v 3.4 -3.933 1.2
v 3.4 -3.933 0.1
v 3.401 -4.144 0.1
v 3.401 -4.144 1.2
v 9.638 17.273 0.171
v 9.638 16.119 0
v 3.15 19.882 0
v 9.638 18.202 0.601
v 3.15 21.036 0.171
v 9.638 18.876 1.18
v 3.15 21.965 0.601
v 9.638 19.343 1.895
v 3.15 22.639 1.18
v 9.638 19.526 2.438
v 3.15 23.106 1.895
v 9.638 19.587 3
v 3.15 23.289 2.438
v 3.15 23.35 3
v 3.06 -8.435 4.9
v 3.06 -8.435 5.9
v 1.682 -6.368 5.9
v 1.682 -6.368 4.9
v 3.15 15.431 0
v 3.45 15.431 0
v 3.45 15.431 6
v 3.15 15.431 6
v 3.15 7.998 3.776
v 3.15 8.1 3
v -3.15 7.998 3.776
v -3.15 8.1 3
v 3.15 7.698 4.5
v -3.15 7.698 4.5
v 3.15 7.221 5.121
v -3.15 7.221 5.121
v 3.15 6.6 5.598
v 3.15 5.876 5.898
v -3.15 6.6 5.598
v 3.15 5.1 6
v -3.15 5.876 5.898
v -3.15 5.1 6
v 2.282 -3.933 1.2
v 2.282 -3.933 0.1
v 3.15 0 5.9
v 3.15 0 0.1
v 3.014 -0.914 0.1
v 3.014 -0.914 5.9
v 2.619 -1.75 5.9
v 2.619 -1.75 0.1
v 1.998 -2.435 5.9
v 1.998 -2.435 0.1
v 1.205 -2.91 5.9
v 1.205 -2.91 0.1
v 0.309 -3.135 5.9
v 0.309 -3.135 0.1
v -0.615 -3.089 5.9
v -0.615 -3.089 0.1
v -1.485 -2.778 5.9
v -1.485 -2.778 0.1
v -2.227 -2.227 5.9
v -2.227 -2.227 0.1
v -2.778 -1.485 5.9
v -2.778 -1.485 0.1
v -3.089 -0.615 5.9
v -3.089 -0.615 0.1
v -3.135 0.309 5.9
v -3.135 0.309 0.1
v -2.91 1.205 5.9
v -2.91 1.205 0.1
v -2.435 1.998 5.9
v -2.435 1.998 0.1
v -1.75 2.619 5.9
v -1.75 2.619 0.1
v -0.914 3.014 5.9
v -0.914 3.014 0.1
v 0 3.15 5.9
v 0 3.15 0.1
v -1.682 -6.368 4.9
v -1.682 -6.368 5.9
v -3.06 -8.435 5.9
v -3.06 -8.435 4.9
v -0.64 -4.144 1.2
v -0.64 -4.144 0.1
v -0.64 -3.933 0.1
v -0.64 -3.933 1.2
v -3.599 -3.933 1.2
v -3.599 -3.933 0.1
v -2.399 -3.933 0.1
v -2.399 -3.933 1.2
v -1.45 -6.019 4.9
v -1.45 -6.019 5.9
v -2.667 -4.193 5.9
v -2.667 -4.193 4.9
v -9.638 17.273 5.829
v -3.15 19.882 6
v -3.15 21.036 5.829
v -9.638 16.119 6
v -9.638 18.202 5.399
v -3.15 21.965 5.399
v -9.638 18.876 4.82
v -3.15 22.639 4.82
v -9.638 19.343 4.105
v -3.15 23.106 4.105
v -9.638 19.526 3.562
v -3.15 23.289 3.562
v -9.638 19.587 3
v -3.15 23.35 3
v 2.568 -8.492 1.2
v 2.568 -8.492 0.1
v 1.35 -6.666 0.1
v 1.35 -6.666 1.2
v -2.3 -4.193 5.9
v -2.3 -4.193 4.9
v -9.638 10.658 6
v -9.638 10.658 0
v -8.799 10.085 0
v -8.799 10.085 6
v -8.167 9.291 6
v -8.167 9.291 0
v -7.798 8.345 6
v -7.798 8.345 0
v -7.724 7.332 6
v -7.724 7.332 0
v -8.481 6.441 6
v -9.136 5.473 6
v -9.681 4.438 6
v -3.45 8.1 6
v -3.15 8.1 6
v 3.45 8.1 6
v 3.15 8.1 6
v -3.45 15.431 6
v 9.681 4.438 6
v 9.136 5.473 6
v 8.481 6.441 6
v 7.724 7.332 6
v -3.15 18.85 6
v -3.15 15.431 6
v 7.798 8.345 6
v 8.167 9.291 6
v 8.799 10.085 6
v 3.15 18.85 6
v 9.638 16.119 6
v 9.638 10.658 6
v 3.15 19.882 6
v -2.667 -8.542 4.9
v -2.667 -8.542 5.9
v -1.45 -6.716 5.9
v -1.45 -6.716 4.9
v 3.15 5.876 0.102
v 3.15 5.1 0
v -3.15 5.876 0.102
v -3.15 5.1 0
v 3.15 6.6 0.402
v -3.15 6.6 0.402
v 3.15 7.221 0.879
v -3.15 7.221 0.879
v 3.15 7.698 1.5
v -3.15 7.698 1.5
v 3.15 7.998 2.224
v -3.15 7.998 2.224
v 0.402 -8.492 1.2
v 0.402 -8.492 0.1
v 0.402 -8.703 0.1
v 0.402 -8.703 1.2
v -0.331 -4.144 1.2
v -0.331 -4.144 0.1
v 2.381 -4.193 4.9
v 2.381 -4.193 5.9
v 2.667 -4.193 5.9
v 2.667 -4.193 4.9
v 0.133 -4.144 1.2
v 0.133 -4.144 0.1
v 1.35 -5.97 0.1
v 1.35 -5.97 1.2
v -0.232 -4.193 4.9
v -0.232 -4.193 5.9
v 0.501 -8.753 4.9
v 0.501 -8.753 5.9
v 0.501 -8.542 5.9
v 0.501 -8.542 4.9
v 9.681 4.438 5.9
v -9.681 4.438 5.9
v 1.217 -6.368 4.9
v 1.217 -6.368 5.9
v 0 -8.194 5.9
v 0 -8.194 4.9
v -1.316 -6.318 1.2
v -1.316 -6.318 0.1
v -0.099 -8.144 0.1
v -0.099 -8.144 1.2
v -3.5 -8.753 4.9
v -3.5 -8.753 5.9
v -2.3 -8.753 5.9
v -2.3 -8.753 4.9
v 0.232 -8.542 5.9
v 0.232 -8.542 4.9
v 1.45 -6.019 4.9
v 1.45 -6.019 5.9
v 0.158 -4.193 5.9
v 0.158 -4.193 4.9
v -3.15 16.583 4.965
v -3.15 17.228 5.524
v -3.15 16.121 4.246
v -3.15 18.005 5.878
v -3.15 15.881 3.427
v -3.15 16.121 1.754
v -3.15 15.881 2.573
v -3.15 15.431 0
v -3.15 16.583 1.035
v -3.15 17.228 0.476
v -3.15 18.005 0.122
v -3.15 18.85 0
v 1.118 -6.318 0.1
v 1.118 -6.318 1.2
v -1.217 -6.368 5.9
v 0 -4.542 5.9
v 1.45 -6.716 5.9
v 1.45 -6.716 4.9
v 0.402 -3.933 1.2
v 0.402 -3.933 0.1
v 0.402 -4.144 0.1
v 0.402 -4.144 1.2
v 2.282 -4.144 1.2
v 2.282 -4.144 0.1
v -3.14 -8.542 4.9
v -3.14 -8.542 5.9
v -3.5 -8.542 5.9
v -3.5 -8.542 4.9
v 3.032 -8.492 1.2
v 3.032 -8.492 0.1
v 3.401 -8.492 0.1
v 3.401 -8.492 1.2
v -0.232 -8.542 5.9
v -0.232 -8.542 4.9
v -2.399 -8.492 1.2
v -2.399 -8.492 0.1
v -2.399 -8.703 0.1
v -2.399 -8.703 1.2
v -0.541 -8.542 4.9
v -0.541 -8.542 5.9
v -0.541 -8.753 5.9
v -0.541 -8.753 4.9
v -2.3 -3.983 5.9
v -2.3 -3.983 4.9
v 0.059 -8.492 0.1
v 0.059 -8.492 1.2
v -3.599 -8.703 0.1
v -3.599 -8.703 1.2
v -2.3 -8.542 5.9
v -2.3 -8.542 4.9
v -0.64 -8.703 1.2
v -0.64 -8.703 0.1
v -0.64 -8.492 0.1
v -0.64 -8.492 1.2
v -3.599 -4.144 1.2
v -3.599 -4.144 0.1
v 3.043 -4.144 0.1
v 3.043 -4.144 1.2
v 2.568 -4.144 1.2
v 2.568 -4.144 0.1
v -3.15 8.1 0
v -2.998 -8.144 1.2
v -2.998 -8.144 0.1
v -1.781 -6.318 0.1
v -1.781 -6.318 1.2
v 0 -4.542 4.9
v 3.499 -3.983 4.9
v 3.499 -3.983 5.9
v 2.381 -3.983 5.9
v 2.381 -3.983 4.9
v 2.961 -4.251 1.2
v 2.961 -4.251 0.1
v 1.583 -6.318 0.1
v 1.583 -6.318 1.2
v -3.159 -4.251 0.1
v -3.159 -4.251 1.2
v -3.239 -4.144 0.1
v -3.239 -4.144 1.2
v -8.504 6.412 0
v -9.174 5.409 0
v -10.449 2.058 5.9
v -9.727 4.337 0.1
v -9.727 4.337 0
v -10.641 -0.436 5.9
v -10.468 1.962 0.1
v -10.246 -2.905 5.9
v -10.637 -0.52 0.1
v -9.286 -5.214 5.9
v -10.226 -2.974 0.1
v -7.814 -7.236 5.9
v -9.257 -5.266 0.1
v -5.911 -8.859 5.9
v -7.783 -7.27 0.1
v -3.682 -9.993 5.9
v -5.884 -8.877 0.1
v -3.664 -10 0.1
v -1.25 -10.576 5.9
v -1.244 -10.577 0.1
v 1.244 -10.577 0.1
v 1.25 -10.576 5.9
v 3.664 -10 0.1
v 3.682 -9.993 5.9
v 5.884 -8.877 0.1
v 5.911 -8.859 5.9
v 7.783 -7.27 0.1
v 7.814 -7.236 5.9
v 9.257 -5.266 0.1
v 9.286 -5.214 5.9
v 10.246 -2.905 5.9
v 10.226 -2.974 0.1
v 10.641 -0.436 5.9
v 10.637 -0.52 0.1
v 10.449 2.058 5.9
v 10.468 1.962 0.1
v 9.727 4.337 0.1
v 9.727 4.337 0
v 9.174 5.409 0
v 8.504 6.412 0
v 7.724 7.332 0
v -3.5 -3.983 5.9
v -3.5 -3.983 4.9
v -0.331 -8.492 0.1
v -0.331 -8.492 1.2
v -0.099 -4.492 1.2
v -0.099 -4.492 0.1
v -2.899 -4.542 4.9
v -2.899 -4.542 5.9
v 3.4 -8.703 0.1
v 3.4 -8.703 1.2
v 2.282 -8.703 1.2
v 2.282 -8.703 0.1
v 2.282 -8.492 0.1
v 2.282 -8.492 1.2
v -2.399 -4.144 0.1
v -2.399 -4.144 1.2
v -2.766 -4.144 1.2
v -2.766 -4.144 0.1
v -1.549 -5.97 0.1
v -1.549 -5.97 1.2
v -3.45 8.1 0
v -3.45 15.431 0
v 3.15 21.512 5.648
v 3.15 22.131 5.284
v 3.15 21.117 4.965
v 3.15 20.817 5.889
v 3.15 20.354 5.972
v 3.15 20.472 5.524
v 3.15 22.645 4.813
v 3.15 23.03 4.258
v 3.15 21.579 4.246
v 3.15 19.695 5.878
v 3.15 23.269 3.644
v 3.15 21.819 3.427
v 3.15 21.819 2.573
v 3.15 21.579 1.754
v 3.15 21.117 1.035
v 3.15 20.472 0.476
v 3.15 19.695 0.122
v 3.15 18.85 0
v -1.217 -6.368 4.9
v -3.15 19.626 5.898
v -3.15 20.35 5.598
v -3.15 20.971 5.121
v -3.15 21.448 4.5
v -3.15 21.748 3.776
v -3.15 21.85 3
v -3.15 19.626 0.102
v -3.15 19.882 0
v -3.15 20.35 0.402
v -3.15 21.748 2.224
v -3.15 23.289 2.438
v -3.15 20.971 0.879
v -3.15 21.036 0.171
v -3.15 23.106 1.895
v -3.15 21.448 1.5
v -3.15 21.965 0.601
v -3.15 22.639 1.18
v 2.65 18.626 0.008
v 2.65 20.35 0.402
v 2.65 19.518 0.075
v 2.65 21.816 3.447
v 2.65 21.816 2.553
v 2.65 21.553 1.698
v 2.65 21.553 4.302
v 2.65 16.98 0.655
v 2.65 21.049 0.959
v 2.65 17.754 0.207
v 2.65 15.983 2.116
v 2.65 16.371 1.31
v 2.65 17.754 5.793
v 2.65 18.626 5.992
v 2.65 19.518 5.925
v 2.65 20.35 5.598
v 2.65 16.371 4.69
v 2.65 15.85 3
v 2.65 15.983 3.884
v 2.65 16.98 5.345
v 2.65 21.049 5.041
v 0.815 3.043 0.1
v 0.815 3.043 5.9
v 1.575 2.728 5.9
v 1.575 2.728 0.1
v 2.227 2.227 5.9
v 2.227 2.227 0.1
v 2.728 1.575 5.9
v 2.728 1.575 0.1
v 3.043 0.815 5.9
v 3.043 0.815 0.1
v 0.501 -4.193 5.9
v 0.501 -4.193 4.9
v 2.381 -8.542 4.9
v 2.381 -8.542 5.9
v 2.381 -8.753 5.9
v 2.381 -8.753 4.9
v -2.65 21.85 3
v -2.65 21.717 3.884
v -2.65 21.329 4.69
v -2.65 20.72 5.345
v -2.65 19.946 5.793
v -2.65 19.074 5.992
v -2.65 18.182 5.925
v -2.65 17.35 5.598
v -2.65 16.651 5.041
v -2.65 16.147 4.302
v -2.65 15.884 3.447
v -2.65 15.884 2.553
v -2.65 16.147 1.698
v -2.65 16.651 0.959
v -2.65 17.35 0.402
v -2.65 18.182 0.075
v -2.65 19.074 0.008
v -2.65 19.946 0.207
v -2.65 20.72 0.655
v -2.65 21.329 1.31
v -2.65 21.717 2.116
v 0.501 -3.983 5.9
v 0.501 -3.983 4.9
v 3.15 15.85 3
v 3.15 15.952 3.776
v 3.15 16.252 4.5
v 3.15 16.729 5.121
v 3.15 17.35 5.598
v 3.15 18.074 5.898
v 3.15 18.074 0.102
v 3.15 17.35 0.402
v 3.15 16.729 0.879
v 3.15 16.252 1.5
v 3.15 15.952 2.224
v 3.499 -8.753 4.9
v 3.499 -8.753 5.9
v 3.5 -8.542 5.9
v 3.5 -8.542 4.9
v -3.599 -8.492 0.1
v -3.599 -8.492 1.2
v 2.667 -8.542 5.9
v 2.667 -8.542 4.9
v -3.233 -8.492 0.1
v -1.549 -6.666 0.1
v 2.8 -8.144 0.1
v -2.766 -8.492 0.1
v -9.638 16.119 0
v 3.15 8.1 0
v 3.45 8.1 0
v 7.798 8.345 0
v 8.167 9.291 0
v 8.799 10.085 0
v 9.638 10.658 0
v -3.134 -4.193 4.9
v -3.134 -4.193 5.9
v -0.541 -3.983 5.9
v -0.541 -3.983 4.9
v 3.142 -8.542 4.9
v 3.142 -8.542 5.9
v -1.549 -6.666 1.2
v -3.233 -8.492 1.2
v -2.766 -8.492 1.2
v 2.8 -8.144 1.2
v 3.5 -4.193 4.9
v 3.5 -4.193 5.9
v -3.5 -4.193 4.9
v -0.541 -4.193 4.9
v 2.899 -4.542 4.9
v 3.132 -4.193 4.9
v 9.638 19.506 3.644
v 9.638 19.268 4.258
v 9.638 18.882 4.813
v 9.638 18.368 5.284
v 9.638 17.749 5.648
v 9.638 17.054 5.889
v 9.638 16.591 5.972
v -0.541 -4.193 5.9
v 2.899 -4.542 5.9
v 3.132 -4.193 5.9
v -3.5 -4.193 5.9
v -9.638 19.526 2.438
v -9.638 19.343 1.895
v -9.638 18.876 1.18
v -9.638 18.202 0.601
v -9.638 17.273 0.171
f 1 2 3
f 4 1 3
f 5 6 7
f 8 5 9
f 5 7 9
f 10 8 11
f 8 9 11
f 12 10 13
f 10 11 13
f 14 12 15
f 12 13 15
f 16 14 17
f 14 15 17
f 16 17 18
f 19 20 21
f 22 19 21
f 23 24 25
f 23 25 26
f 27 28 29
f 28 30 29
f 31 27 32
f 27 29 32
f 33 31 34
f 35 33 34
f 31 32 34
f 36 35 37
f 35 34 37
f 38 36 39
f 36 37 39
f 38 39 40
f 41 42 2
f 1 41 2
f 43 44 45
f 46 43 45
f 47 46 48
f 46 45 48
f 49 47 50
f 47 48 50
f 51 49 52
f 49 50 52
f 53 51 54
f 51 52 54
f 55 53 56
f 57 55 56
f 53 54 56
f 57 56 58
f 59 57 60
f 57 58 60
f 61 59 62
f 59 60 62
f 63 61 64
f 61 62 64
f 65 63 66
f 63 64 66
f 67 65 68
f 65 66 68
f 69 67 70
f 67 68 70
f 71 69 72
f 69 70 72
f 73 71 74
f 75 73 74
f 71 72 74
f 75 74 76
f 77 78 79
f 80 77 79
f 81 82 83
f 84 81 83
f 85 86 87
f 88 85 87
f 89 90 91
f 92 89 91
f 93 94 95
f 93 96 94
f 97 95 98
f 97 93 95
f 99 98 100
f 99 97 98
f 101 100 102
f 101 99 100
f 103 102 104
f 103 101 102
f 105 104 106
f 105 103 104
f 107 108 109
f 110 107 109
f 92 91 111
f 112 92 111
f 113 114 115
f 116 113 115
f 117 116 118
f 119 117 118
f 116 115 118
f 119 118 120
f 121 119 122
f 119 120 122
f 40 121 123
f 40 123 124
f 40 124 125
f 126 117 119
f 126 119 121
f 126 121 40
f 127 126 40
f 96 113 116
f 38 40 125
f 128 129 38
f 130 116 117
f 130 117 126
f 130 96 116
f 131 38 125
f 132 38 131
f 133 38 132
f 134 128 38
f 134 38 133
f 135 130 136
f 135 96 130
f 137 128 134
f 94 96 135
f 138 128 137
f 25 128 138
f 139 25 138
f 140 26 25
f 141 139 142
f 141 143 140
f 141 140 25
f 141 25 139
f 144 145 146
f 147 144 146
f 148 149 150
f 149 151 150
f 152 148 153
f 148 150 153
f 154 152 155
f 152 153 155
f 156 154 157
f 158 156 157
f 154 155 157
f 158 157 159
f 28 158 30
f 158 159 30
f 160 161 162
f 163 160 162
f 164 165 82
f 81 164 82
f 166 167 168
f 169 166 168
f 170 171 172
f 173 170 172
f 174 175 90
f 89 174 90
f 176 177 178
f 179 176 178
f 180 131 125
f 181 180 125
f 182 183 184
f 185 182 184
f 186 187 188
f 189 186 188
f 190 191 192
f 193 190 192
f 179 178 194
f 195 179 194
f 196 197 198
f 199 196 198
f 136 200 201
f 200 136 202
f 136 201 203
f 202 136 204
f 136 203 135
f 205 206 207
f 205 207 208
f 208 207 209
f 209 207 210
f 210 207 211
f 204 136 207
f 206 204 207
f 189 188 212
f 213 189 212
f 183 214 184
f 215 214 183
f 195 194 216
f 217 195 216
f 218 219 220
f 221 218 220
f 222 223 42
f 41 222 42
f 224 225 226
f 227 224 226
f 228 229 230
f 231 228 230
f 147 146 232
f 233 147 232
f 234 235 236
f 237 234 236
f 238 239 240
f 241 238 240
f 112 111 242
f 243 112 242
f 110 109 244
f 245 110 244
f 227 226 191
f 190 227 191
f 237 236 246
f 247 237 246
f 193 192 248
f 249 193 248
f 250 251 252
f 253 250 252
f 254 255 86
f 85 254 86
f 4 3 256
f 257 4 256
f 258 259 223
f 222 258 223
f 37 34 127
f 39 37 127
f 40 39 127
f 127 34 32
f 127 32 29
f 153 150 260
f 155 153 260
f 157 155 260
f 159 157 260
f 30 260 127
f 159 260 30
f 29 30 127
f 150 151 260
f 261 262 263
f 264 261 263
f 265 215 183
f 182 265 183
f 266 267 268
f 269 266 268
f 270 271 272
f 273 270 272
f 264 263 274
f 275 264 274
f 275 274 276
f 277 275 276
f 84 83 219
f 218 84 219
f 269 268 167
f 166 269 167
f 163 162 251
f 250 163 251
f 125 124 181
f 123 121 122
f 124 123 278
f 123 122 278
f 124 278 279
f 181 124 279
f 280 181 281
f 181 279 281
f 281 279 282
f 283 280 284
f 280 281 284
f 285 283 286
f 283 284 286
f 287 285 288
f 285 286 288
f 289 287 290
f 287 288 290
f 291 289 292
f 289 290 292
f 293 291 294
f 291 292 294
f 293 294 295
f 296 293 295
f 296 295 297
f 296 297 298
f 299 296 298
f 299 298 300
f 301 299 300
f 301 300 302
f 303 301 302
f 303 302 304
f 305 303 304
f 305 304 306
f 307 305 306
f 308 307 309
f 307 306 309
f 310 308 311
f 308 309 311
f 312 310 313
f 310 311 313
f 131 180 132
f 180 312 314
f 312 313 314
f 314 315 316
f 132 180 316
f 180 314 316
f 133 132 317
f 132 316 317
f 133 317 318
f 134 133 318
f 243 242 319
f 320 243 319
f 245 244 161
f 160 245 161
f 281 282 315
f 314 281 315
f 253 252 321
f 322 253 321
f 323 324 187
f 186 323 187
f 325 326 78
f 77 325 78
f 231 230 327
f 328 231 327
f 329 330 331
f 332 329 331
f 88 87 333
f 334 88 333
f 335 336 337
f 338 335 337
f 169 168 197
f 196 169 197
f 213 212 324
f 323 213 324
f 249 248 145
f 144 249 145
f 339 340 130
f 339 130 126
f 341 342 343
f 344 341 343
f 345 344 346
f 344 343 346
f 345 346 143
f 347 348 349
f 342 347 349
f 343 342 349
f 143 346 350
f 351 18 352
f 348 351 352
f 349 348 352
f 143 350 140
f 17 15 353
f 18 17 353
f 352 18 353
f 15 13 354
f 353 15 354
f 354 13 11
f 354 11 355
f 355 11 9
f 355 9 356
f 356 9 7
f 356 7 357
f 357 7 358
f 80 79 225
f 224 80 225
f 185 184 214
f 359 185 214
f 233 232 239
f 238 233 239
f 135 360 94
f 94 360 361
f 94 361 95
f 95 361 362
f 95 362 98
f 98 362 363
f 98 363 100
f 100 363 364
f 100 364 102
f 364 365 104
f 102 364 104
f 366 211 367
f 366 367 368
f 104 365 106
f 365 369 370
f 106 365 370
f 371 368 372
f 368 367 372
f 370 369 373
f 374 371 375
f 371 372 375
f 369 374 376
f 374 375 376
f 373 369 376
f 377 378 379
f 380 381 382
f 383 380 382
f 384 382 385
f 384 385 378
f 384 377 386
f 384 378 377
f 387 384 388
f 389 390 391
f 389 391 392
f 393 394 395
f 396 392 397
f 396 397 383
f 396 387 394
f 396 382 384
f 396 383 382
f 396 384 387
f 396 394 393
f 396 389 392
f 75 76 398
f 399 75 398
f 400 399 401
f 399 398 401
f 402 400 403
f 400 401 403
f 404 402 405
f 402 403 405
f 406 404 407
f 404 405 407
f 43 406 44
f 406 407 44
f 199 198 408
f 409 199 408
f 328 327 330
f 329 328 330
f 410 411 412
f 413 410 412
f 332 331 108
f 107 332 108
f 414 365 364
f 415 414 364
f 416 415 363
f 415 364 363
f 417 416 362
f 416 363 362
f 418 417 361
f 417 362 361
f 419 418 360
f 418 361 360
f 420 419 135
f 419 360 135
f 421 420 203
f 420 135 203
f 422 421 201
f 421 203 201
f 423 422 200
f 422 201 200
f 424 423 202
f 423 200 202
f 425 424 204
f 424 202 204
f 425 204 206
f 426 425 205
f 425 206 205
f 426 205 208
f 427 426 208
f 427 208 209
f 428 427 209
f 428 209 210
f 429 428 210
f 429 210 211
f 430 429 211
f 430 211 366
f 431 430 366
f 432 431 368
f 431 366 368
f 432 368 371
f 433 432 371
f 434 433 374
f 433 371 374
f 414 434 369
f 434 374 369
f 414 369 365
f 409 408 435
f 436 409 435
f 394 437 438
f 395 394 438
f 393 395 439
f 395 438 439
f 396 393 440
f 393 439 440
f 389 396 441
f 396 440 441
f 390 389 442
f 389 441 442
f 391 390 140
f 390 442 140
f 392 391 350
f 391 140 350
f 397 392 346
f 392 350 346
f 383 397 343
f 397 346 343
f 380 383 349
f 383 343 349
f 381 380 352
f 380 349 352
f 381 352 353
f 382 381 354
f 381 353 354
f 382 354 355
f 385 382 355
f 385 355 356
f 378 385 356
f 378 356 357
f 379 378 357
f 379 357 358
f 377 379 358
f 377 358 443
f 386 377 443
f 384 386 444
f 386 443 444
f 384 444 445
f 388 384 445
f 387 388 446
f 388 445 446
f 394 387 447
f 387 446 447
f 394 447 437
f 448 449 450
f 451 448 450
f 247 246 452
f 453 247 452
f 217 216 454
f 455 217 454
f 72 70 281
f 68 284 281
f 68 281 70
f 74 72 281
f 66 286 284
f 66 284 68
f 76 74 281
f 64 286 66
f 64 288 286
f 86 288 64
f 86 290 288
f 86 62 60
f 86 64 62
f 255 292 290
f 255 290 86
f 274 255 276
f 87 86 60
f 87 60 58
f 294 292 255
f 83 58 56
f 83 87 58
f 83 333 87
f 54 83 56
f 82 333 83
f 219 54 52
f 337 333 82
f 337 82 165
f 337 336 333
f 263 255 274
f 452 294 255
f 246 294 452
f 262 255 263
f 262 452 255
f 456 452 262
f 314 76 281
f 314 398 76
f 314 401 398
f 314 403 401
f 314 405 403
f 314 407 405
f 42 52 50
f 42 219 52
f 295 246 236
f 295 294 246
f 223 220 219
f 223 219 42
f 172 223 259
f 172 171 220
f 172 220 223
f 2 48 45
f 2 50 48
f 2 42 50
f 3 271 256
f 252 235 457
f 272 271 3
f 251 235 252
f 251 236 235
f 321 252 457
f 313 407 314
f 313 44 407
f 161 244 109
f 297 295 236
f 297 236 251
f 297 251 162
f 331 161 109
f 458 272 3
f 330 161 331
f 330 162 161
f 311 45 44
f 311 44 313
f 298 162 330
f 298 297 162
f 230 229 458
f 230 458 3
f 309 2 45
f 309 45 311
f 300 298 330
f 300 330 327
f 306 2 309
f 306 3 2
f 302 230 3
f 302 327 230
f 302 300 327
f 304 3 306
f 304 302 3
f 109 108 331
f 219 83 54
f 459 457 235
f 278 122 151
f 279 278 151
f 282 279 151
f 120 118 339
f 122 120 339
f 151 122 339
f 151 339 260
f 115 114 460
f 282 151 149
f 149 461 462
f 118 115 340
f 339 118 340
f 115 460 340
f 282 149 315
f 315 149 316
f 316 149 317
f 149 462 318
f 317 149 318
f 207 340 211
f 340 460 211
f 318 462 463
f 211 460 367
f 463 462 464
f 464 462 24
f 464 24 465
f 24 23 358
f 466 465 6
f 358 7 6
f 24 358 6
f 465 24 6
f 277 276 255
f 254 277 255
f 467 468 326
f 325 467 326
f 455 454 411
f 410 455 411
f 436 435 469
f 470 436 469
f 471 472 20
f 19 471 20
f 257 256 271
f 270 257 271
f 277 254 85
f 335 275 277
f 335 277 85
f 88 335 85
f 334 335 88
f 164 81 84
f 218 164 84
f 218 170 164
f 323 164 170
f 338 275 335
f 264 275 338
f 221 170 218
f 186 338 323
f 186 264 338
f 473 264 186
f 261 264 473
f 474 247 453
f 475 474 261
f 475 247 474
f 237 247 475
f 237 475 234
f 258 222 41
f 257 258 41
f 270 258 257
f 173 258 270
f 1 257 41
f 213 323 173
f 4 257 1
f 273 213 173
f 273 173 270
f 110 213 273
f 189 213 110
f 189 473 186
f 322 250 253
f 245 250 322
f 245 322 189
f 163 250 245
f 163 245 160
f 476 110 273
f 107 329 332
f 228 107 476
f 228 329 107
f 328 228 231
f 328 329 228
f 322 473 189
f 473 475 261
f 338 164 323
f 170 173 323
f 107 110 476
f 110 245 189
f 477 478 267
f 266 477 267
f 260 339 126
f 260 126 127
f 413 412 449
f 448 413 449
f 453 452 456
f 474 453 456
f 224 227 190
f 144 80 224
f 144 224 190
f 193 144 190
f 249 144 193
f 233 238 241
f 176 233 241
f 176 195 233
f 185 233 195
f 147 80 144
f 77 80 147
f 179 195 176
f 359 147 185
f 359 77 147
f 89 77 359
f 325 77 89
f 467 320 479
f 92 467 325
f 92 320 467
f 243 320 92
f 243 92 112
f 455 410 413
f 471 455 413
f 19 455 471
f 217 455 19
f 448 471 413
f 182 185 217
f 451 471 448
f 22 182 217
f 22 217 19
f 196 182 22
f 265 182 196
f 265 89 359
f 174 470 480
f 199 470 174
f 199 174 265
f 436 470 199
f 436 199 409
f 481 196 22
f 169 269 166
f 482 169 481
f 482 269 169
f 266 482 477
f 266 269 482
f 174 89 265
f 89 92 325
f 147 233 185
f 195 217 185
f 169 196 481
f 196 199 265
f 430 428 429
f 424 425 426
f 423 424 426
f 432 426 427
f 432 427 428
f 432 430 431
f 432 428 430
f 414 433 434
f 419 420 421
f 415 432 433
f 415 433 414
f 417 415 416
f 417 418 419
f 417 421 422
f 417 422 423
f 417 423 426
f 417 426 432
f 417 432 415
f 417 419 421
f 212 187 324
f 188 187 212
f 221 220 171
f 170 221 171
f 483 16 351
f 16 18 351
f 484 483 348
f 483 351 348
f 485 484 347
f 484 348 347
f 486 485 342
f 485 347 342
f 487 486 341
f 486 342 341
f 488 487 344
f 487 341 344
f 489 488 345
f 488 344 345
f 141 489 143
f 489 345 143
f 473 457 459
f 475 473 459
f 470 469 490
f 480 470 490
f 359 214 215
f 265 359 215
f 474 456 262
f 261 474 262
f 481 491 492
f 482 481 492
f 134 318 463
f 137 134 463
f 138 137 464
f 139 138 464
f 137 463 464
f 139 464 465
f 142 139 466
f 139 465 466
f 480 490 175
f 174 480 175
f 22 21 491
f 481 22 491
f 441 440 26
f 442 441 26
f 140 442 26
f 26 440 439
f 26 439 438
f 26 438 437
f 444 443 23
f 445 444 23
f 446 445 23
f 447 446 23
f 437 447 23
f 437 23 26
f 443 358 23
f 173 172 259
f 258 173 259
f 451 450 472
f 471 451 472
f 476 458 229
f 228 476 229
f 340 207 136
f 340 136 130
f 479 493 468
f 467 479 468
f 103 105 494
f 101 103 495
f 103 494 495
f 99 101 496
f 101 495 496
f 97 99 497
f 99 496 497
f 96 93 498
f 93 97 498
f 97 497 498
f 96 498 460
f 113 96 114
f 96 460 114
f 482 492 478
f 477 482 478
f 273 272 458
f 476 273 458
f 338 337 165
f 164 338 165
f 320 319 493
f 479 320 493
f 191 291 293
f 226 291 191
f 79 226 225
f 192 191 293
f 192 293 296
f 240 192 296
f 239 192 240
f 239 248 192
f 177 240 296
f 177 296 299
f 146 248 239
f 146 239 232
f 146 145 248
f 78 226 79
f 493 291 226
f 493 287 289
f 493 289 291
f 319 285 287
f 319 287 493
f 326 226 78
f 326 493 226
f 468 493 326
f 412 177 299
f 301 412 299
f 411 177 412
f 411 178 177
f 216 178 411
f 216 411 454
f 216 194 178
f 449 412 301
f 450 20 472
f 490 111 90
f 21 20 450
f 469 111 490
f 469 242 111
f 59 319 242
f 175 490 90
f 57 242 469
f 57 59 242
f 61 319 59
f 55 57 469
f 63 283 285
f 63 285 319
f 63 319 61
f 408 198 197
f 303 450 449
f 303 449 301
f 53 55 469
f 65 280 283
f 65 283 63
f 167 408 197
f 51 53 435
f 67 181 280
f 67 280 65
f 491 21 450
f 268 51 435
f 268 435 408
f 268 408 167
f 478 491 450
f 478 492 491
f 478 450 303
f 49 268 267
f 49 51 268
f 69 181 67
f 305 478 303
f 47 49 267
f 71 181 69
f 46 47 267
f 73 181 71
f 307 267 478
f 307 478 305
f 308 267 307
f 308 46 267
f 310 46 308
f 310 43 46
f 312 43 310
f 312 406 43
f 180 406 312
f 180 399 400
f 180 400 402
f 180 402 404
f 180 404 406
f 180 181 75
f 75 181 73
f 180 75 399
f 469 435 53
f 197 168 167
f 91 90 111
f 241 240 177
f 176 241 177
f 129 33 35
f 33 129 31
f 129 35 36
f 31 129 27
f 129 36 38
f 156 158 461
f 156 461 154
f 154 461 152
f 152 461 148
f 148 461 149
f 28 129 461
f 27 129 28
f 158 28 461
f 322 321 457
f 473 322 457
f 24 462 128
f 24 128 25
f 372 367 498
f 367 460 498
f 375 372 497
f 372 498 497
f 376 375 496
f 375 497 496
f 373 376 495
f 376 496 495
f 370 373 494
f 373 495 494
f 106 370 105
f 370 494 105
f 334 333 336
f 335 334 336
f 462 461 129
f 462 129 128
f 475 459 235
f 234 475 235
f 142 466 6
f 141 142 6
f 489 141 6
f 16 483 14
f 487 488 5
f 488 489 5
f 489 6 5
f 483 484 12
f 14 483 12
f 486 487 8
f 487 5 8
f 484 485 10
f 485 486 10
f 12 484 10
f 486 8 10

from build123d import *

# Parameters (mm, degrees)
F1_DEPTH  = 6
F2_R      = 3
F3_DEPTH  = 0.5
F4_R      = 3
F5_DEPTH  = 0.5
F6_R      = 2.99999
F7_R      = 2.99999
F9_DEPTH  = 1.1
F11_DEPTH = 1.2
F12_R     = 2.99999
F14_DEPTH = 13.4
F16_DEPTH = 0.1
F18_DEPTH = 0.1


# Not quite as in the source:
# - a fillet or chamfer is up to 0.001 mm smaller than in the source, because OpenCascade refuses the exact size


with BuildPart() as f1:
    # F0 (on Top) → F1 (new body)
    with BuildSketch(Plane.XY):
        with BuildLine():
            Line((-3.15, 8.1), (-3.15, 10.1734949747))
            ThreePointArc((-3.15, 10.1734949747), (-5.6194604457, 9.046776459), (-7.7238904562, 7.3323949854))
            ThreePointArc((-7.7238904562, 7.3323949854), (0, -10.65), (7.7238904562, 7.3323949854))
            ThreePointArc((7.7238904562, 7.3323949854), (5.6194604457, 9.046776459), (3.15, 10.1734949747))
            Line((3.15, 10.1734949747), (3.15, 8.1))
            Line((3.15, 8.1), (0, 8.1))
            Line((0, 8.1), (-3.15, 8.1))
        make_face()
        with BuildLine():
            ThreePointArc((3.15, 0), (-2.2273863607, -2.2273863607), (0, 3.15))
            ThreePointArc((0, 3.15), (2.2273863607, 2.2273863607), (3.15, 0))
        make_face(mode=Mode.SUBTRACT)
        with BuildLine():
            ThreePointArc((-7.7238904562, 7.3323949854), (-5.6194604457, 9.046776459), (-3.15, 10.1734949747))
            Line((-3.15, 10.1734949747), (-3.15, 23.35))
            Line((-3.15, 23.35), (-9.6377339195, 19.5871143267))
            Line((-9.6377339195, 19.5871143267), (-9.6377339195, 10.6575252249))
            ThreePointArc((-9.6377339195, 10.6575252249), (-8.1670066914, 9.2906908645), (-7.7238904562, 7.3323949854))
        make_face()
        with BuildLine():
            ThreePointArc((3.15, 10.1734949747), (5.6194604457, 9.046776459), (7.7238904562, 7.3323949854))
            ThreePointArc((7.7238904562, 7.3323949854), (8.1670066914, 9.2906908645), (9.6377339195, 10.6575252249))
            Line((9.6377339195, 10.6575252249), (9.6377339195, 19.5871143267))
            Line((9.6377339195, 19.5871143267), (3.15, 23.35))
            Line((3.15, 23.35), (3.15, 10.1734949747))
        make_face()
    extrude(amount=F1_DEPTH)

    # F2 (on face) → F3 (join)
    with BuildSketch(Plane.YZ.offset(-3.15)):
        with Locations((18.85, 3)):
            Circle(F2_R)
    extrude(amount=F3_DEPTH)

    # F4 (on face) → F5 (join)
    with BuildSketch(Plane(origin=(3.15, 0, 0), x_dir=(0, -1, 0), z_dir=(-1, 0, 0))):
        with Locations((-18.85, 3)):
            Circle(F4_R)
    extrude(amount=F5_DEPTH)

    # F6 (radius 3 in the source; OpenCascade refuses exactly that, so slightly less here)
    f6_edges = [f1.edges().sort_by_distance(p)[0] for p in [
        (-6.393867, 21.468557, 0),
        (-6.393867, 21.468557, 6),
    ]]
    fillet(f6_edges, radius=F6_R)

    # F7 (radius 3 in the source; OpenCascade refuses exactly that, so slightly less here)
    f7_edges = [f1.edges().sort_by_distance(p)[0] for p in [
        (6.393867, 21.468557, 0),
        (6.393867, 21.468557, 6),
    ]]
    fillet(f7_edges, radius=F7_R)

    # F8 (on face) → F9 (cut)
    with BuildSketch(Plane.XY.offset(6)):
        Polygon((-0.5410675658, -4.1934514275), (-0.2322952287, -4.1934514275), (-1.4496098506, -6.0194233604), (-2.6669244725, -4.1934514275), (-2.3, -4.1934514275), (-2.3, -3.9827399887), (-3.5, -3.9827399887), (-3.5, -4.1934514275), (-3.1341812573, -4.1934514275), (-2.8992197012, -4.5418942706), (-1.6819050793, -6.3678662034), (-3.0600394749, -8.4350677969), (-3.1399389263, -8.5422809794), (-3.5, -8.5422809794), (-3.5, -8.7529924182), (-2.3, -8.7529924182), (-2.3, -8.5422809794), (-2.6669244725, -8.5422809794), (-1.4496098506, -6.7163090465), (-0.2322952287, -8.5422809794), (-0.5410675658, -8.5422809794), (-0.5410675658, -8.7529924182), (0.5013382179, -8.7529924182), (0.5013382179, -8.5422809794), (0.2322952287, -8.5422809794), (1.4496098506, -6.7163090465), (2.6669244725, -8.5422809794), (2.3810260464, -8.5422809794), (2.3810260464, -8.7529924182), (3.4986780956, -8.7529924182), (3.5, -8.5422809794), (3.1424169429, -8.5422809794), (3.0600394749, -8.4350677969), (1.6819050793, -6.3678662034), (2.8992197012, -4.5418942706), (3.1315149299, -4.1934514275), (3.3579636365, -4.1934514275), (3.5, -4.1934514275), (3.4986780956, -3.9827399887), (2.3810260464, -3.9827399887), (2.3810260464, -4.1934514275), (2.6669244725, -4.1934514275), (1.4496098506, -6.0194233604), (0.1581401168, -4.1934514275), (0.5013382179, -4.1934514275), (0.5013382179, -3.9827399887), (-0.5410675658, -3.9827399887), align=None)
        Polygon((-1.2173146219, -6.3678662034), (0, -4.5418942706), (1.2173146219, -6.3678662034), (0, -8.1938381363), align=None, mode=Mode.SUBTRACT)
    extrude(amount=-F9_DEPTH, mode=Mode.SUBTRACT)

    # F10 (on face) → F11 (cut)
    with BuildSketch(Plane(origin=(0, 0, 0), x_dir=(1, 0, 0), z_dir=(0, 0, -1))):
        Polygon((-0.6402181378, 8.4924687258), (-0.3314458007, 8.4924687258), (-1.5487604226, 6.6664967929), (-2.7660750445, 8.4924687258), (-2.399150572, 8.4924687258), (-2.399150572, 8.7031801646), (-3.599150572, 8.7031801646), (-3.599150572, 8.4924687258), (-3.2333318293, 8.4924687258), (-2.9983702732, 8.1440258827), (-1.7810556513, 6.3180539499), (-3.1591900469, 4.2508523564), (-3.2390894983, 4.1436391739), (-3.599150572, 4.1436391739), (-3.599150572, 3.9329277351), (-2.399150572, 3.9329277351), (-2.399150572, 4.1436391739), (-2.7660750445, 4.1436391739), (-1.5487604226, 5.9696111068), (-0.3314458007, 4.1436391739), (-0.6402181378, 4.1436391739), (-0.6402181378, 3.9329277351), (0.4021876459, 3.9329277351), (0.4021876459, 4.1436391739), (0.1331446567, 4.1436391739), (1.3504592786, 5.9696111068), (2.5677739006, 4.1436391739), (2.2818754744, 4.1436391739), (2.2818754744, 3.9329277351), (3.3995275237, 3.9329277351), (3.400849428, 4.1436391739), (3.0432663709, 4.1436391739), (2.960888903, 4.2508523564), (1.5827545073, 6.3180539499), (2.8000691293, 8.1440258827), (3.032364358, 8.4924687258), (3.2588130645, 8.4924687258), (3.400849428, 8.4924687258), (3.3995275237, 8.7031801646), (2.2818754744, 8.7031801646), (2.2818754744, 8.4924687258), (2.5677739006, 8.4924687258), (1.3504592786, 6.6664967929), (0.0589895449, 8.4924687258), (0.4021876459, 8.4924687258), (0.4021876459, 8.7031801646), (-0.6402181378, 8.7031801646), align=None)
        Polygon((-1.3164651939, 6.3180539499), (-0.099150572, 8.1440258827), (1.1181640499, 6.3180539499), (-0.099150572, 4.492082017), align=None, mode=Mode.SUBTRACT)
    extrude(amount=-F11_DEPTH, mode=Mode.SUBTRACT)

    # F12 (radius 3 in the source; OpenCascade refuses exactly that, so slightly less here)
    f12_edges = [f1.edges().sort_by_distance(p)[0] for p in [
        (0, 8.1, 0),
        (0, 8.1, 6),
    ]]
    fillet(f12_edges, radius=F12_R)

    # F13 (on Top) → F14 (cut)
    with BuildSketch(Plane.XY):
        Polygon((-3.4496616572, 8.1000812352), (-3.1200703233, 8.1000812352), (-3.1314746011, 15.4313463718), (-3.4496616572, 15.4313463718), align=None)
        Polygon((3.1499122269, 8.1000812352), (3.4496616572, 8.1000812352), (3.4496616572, 15.4313463718), (3.1314746011, 15.4313463718), align=None)
    extrude(amount=F14_DEPTH, mode=Mode.SUBTRACT)

    # F15 (on face) → F16 (cut)
    with BuildSketch(Plane(origin=(0, 0, 0), x_dir=(1, 0, 0), z_dir=(0, 0, -1))):
        with BuildLine():
            Line((9.7270584918, -4.3366845744), (9.7615409984, -4.3366845744))
            ThreePointArc((9.7615409984, -4.3366845744), (0, 10.6815034411), (-9.7615409984, -4.3366845744))
            Line((-9.7615409984, -4.3366845744), (-9.7270584918, -4.3366845744))
            Line((-9.7270584918, -4.3366845744), (9.7270584918, -4.3366845744))
        make_face()
    extrude(amount=-F16_DEPTH, mode=Mode.SUBTRACT)

    # F17 (on face) → F18 (cut)
    with BuildSketch(Plane.XY.offset(6)):
        with BuildLine():
            Line((9.646881219, 4.4377580388), (-9.6813637257, 4.4377580388))
            ThreePointArc((-9.6813637257, 4.4377580388), (0, -10.65), (9.6813637257, 4.4377580388))
            Line((9.6813637257, 4.4377580388), (9.646881219, 4.4377580388))
        make_face()
    extrude(amount=-F18_DEPTH, mode=Mode.SUBTRACT)


solid = f1.part
